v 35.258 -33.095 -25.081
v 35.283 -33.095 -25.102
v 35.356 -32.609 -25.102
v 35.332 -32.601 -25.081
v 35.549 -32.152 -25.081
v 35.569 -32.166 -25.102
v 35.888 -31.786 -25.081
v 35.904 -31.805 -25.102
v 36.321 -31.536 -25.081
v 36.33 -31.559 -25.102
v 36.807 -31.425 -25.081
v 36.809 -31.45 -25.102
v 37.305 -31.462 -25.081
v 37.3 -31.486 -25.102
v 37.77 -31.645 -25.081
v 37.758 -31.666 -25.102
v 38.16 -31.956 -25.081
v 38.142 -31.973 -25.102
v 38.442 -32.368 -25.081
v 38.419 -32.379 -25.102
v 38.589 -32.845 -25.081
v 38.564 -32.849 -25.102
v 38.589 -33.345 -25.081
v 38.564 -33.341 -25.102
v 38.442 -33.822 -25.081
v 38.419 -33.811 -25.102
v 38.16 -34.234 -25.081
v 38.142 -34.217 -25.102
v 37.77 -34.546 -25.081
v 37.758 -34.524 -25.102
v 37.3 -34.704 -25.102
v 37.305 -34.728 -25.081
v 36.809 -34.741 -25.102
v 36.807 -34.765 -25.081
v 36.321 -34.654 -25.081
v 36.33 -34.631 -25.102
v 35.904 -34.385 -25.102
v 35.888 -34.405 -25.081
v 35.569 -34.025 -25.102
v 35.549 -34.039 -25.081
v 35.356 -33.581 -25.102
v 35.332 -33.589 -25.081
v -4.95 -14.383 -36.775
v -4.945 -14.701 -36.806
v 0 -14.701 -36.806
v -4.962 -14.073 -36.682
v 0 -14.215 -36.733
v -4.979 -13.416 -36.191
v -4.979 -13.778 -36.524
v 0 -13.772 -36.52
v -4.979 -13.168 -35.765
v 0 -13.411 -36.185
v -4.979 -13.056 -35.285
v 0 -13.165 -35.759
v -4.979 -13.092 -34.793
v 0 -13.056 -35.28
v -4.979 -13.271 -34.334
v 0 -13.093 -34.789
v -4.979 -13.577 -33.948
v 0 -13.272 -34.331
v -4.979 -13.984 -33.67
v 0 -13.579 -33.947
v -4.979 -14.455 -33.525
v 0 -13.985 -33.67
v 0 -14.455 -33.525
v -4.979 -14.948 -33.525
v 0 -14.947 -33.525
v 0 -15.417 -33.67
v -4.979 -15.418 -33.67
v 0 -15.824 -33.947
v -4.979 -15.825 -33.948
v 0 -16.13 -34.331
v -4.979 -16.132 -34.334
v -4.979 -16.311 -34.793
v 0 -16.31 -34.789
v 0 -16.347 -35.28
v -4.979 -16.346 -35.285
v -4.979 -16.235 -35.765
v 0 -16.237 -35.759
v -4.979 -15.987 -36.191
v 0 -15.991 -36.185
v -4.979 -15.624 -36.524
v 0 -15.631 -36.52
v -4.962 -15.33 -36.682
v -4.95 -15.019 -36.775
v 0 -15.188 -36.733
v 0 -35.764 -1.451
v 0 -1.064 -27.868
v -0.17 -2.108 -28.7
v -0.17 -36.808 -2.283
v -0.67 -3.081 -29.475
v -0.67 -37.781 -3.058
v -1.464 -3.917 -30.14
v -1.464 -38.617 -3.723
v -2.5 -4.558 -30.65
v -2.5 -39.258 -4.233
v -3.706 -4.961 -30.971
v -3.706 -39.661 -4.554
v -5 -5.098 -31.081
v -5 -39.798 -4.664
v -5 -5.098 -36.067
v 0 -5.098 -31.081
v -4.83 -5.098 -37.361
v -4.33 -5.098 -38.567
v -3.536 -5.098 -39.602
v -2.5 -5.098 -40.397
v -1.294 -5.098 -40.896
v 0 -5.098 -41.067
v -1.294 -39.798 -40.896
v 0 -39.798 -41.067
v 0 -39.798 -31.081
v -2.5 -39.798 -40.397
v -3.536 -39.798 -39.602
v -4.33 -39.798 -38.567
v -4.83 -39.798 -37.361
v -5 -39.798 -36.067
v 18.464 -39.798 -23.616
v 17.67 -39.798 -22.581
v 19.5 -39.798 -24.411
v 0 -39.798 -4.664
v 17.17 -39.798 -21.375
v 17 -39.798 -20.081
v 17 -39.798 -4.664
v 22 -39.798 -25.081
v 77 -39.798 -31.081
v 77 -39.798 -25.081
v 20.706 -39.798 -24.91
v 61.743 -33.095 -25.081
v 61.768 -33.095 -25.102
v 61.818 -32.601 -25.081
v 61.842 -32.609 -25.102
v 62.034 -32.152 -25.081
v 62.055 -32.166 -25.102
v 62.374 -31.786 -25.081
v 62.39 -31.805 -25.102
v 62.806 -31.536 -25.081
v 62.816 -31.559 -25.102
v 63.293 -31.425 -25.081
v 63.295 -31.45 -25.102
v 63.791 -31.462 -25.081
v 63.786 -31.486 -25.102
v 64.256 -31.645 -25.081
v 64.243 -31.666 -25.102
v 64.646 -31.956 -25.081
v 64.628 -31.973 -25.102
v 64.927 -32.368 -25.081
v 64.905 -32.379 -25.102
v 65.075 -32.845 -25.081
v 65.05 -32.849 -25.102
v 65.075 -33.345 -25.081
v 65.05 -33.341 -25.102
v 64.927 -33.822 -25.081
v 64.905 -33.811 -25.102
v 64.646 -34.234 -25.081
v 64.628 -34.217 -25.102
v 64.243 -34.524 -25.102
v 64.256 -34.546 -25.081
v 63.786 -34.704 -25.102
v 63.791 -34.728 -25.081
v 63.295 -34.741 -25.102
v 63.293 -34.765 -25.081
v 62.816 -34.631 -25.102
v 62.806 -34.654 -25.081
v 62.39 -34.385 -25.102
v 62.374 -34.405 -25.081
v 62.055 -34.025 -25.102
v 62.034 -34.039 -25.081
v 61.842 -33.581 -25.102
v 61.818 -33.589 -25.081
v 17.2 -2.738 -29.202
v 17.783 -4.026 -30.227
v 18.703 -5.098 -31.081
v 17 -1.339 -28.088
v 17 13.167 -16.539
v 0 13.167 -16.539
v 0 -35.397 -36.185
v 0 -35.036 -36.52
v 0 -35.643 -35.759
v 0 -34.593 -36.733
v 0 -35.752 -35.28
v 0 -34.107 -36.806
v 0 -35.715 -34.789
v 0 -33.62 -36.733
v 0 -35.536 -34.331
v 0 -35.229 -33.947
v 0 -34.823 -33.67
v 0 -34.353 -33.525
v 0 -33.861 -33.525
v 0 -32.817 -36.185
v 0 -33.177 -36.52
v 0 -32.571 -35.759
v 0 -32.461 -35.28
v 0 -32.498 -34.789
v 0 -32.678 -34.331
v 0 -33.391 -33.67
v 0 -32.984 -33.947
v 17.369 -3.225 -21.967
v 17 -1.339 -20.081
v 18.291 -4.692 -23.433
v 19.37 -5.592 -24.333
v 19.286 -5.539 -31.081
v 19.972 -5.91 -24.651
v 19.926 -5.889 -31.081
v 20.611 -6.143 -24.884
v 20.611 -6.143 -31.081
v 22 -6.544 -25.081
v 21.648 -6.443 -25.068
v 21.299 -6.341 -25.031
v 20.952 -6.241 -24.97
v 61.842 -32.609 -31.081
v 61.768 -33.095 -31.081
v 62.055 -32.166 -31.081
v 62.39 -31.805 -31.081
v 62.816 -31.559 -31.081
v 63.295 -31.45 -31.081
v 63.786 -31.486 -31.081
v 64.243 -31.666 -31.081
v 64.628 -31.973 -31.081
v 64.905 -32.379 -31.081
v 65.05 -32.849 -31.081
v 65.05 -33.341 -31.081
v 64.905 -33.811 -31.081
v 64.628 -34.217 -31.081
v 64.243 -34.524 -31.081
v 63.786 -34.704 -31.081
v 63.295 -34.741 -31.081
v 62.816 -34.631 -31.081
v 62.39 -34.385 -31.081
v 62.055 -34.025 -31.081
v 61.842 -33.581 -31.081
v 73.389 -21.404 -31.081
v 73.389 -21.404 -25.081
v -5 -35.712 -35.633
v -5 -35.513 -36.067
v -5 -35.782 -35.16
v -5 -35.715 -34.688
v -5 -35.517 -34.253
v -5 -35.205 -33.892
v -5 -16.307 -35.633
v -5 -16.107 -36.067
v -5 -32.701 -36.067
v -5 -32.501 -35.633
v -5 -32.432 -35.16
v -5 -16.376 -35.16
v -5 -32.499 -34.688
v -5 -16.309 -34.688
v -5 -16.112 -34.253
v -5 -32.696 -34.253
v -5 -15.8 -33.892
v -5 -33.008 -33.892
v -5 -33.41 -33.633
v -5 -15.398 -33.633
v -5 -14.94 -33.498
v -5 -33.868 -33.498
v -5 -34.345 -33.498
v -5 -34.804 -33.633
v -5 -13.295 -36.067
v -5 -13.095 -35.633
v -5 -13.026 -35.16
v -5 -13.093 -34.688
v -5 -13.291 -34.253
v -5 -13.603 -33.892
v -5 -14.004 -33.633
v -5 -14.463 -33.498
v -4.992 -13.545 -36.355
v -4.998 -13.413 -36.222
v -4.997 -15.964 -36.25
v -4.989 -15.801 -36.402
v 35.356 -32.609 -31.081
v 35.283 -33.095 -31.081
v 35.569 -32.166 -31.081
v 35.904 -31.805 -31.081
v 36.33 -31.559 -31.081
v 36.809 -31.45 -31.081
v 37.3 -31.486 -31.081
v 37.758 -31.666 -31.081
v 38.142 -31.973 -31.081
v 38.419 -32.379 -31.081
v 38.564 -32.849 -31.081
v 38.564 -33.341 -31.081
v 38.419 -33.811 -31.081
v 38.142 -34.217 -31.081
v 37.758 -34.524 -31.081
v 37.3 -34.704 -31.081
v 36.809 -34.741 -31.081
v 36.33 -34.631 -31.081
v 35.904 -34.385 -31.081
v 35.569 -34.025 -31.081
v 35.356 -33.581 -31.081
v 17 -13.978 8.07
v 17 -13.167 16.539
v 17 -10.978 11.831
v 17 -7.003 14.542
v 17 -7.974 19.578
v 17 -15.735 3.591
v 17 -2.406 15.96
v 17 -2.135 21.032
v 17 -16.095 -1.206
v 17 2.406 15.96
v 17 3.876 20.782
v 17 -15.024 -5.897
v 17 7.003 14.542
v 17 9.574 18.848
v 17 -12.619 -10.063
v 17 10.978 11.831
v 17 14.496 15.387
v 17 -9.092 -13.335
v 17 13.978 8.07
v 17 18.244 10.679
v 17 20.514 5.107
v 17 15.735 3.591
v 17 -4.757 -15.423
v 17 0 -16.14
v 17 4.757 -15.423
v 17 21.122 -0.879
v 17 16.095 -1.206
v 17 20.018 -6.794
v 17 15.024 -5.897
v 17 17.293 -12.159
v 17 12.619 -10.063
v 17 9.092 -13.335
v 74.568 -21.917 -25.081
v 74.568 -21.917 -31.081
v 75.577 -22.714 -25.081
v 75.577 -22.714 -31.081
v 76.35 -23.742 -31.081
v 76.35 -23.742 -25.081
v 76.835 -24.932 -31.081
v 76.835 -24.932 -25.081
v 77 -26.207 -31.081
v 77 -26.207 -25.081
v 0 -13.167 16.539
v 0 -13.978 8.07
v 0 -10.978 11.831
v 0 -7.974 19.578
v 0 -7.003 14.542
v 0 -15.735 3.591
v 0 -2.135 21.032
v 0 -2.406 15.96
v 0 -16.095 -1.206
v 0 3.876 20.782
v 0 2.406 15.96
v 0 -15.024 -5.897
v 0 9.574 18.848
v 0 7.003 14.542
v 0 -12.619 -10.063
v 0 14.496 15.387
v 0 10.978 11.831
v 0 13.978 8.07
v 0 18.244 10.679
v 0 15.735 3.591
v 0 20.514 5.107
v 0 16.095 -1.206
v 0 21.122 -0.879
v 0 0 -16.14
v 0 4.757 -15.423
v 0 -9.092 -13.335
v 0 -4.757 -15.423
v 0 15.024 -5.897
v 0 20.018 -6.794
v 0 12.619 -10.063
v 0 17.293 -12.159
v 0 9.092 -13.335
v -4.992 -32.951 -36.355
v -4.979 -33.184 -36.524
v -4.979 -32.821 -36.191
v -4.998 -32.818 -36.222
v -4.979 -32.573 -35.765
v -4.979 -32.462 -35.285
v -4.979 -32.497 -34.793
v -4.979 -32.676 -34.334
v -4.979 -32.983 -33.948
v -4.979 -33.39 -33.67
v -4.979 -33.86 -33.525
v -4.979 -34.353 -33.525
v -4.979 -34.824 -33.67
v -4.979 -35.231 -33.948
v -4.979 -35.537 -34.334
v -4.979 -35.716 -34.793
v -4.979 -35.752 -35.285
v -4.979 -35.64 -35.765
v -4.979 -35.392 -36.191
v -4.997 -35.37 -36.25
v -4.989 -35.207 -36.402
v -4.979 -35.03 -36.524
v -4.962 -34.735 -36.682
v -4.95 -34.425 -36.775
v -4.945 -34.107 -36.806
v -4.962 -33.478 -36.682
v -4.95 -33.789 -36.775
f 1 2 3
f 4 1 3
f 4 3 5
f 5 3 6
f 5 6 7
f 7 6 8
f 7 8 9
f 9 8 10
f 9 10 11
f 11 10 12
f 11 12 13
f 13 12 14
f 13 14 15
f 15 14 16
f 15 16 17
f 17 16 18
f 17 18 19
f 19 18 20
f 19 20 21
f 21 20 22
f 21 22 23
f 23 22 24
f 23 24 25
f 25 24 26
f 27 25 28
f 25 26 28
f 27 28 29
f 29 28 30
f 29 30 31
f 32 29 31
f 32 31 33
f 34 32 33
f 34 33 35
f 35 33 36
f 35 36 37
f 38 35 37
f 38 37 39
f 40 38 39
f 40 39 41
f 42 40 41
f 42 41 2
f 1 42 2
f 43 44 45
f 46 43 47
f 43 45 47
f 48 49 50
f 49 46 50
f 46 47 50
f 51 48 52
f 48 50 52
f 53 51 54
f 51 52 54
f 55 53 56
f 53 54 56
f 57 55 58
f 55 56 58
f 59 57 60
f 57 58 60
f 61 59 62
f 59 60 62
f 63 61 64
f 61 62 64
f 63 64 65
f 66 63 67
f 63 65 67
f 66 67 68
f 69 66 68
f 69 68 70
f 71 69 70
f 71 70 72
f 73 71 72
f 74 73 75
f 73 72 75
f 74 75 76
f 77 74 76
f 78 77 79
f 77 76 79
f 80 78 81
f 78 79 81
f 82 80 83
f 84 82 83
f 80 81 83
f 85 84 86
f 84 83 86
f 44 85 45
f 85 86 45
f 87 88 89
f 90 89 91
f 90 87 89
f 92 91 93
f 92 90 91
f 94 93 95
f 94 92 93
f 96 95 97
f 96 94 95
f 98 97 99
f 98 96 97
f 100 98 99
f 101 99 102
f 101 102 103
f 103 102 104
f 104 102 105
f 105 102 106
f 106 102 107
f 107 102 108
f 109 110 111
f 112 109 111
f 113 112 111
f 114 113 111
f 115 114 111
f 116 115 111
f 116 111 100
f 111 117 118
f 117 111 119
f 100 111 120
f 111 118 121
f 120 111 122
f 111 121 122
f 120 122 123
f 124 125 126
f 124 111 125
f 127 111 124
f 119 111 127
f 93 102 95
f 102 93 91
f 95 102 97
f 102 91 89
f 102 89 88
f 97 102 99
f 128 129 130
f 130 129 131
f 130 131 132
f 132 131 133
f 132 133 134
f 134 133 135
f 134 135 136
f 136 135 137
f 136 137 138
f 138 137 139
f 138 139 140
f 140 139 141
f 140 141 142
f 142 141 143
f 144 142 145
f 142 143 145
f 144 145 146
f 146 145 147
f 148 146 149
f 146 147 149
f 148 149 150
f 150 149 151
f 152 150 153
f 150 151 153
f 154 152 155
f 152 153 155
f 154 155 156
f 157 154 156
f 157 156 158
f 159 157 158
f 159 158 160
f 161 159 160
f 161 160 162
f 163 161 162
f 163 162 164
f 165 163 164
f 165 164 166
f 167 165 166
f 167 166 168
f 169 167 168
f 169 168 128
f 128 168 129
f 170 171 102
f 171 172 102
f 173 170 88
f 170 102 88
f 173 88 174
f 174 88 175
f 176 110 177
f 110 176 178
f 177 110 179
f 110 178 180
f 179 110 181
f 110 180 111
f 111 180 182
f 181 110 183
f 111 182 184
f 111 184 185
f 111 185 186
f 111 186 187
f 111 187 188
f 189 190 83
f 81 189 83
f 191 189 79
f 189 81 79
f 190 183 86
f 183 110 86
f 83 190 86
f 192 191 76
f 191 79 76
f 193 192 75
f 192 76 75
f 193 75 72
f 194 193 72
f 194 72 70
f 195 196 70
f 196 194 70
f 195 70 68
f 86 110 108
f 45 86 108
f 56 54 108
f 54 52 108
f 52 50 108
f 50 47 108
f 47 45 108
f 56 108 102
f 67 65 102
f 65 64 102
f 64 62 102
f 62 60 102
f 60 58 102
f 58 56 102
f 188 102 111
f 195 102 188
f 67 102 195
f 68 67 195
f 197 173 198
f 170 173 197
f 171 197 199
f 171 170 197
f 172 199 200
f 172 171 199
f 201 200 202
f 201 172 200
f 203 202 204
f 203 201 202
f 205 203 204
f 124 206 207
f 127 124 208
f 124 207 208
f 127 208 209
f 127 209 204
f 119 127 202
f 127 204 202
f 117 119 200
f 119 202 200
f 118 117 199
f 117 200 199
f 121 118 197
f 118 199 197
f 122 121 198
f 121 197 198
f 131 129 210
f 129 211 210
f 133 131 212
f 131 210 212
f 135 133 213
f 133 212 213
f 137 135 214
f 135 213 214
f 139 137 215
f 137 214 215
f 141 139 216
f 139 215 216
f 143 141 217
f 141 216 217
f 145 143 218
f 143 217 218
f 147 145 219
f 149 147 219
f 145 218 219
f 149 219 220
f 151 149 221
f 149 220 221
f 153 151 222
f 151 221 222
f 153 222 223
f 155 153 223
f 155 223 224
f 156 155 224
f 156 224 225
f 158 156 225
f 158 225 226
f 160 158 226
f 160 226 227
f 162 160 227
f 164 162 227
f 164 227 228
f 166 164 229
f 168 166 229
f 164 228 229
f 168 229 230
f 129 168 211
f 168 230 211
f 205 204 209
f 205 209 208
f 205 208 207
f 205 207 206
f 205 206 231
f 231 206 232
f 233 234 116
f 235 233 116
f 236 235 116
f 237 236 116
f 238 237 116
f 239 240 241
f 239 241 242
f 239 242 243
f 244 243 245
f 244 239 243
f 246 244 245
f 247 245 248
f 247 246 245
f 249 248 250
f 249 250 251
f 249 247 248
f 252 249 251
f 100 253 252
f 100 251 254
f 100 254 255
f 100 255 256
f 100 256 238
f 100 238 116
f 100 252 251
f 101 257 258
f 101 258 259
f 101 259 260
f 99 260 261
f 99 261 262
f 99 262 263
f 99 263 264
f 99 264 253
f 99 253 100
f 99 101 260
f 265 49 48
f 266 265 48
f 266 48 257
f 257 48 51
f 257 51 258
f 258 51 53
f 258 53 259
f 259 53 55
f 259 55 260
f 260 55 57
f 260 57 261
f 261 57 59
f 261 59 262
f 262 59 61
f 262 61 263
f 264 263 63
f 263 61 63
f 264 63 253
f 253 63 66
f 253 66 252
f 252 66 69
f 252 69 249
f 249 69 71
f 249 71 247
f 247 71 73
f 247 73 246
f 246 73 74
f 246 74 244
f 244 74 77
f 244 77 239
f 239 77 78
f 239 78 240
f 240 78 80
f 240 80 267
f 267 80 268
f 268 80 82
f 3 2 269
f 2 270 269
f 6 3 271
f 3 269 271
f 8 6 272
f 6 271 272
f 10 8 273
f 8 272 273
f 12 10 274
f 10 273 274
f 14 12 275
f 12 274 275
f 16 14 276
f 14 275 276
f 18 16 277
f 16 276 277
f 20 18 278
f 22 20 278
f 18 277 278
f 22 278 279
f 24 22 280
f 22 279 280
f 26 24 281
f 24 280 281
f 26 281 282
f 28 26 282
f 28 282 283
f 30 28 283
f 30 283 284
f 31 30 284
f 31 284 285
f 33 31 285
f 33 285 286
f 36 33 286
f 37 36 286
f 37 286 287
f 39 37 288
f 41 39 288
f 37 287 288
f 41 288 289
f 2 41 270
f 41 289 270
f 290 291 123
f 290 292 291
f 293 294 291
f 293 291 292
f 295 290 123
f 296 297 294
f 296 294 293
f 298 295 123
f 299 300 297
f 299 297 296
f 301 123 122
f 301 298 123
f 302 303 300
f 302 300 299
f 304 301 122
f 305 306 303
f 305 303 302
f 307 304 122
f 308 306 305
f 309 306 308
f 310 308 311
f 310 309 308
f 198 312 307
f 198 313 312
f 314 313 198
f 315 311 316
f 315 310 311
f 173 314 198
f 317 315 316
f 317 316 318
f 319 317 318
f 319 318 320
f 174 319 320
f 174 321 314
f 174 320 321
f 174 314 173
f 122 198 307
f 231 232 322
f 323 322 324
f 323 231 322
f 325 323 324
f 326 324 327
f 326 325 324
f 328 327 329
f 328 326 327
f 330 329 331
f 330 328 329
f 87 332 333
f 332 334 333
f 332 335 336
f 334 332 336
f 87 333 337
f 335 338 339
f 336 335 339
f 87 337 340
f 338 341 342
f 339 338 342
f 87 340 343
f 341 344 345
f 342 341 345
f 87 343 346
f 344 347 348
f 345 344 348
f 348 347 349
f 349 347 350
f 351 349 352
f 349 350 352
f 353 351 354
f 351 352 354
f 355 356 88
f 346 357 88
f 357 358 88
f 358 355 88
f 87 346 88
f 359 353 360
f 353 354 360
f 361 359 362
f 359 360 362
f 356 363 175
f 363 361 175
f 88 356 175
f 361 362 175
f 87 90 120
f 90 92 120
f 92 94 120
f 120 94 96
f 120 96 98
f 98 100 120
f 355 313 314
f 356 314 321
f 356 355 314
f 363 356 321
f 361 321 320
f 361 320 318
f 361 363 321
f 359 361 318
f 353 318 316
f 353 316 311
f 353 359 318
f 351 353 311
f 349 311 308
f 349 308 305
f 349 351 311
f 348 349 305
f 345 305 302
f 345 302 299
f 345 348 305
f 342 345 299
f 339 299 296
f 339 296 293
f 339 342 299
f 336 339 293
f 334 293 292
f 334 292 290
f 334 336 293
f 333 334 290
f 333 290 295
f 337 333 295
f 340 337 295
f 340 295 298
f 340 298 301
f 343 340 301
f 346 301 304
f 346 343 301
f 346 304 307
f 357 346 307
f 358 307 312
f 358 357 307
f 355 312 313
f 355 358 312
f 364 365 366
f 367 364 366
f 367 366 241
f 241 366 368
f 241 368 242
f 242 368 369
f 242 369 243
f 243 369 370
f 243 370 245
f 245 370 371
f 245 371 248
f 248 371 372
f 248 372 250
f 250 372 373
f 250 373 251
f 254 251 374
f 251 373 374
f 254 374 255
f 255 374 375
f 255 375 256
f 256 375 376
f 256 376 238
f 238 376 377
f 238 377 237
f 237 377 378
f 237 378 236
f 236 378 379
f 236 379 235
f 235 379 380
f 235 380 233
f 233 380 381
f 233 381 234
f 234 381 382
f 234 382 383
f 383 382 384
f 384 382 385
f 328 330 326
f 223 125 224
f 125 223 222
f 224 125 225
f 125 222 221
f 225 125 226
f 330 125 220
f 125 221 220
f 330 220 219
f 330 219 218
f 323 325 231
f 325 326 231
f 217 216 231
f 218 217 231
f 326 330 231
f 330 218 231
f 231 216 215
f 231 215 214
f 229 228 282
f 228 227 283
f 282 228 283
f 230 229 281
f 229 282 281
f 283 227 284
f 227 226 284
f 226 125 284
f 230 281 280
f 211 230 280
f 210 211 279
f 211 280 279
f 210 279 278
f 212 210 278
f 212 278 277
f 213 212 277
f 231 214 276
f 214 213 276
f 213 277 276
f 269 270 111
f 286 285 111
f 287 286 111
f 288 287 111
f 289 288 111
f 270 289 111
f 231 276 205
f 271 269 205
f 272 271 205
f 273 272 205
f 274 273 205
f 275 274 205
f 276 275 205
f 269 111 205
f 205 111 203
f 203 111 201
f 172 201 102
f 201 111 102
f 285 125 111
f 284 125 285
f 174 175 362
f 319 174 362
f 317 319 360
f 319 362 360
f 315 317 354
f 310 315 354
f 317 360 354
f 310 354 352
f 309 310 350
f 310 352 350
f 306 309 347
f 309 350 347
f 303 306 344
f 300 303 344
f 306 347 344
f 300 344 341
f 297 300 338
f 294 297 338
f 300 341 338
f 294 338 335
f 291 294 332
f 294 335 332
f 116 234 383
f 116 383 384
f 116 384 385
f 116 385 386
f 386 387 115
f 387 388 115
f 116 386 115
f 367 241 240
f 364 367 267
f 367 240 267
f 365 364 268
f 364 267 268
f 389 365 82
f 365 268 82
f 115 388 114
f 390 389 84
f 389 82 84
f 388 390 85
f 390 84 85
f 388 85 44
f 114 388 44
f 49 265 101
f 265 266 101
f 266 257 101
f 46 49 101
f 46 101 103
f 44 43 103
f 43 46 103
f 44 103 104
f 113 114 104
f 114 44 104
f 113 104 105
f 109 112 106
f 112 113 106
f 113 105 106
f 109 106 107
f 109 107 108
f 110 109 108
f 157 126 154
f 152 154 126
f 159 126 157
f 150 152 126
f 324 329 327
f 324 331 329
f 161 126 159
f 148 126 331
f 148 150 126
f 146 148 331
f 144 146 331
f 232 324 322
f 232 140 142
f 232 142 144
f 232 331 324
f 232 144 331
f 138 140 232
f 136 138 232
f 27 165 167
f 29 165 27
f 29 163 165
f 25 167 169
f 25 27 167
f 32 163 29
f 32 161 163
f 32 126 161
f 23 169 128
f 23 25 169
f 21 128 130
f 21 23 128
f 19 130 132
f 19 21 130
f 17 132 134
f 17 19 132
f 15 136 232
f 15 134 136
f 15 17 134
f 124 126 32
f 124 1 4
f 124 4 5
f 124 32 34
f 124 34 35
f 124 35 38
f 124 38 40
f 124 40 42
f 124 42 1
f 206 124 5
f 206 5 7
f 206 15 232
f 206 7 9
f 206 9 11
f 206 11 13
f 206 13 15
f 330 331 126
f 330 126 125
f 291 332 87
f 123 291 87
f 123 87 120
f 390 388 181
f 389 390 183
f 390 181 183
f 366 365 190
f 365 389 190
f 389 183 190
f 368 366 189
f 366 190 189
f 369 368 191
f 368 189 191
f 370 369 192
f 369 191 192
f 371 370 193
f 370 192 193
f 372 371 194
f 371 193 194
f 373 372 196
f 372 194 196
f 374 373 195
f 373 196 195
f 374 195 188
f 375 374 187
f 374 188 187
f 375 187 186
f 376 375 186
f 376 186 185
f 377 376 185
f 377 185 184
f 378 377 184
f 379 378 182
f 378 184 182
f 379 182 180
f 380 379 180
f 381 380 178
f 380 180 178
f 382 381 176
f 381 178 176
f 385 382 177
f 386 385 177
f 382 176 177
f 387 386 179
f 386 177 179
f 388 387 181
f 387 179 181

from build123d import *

# Parameters (mm, degrees)
SKETCH1_R                             = 21.14
SKETCH1_R_2                           = 16.14
BOSS_EXTRUDE1_DEPTH                   = 17
BOSS_EXTRUDE2_DEPTH                   = 17
SKETCH3_W                             = 6
SKETCH3_H                             = 34.7
BOSS_EXTRUDE3_DEPTH                   = 60
CUT_EXTRUDE1_DEPTH                    = 30
FILLET1_R                             = 5
BOSS_EXTRUDE4_DEPTH                   = 5
FILLET2_R                             = 5
TAP_DRILL_FOR_M4X0_7_TAP1_D           = 3.3
TAP_DRILL_FOR_M4X0_7_TAP1_DEPTH       = 5
TAP_DRILL_FOR_M4X0_7_TAP1_CSINK_D     = 3.35
TAP_DRILL_FOR_M4X0_7_TAP1_CSINK_ANGLE = 100
TAP_DRILL_FOR_M4X0_7_TAP1_TIP         = 0.991420021
TAP_DRILL_FOR_M4X0_7_TAP2_D           = 3.3
TAP_DRILL_FOR_M4X0_7_TAP2_DEPTH       = 7
TAP_DRILL_FOR_M4X0_7_TAP2_CSINK_D     = 3.35
TAP_DRILL_FOR_M4X0_7_TAP2_CSINK_ANGLE = 100
TAP_DRILL_FOR_M4X0_7_TAP2_TIP         = 0.991420021


with BuildPart() as part:
    # Sketch1 → Boss-Extrude1 (new body)
    with BuildSketch(Plane(origin=(0, 0, 0), x_dir=(0, 0, -1), z_dir=(1, 0, 0))):
        Circle(SKETCH1_R)
        Circle(SKETCH1_R_2, mode=Mode.SUBTRACT)
    extrude(amount=BOSS_EXTRUDE1_DEPTH)

    # Sketch2 → Boss-Extrude2 (add)
    with BuildSketch(Plane.ZY):
        with BuildLine():
            Line((-31.080697416, -39.798400642), (-31.080697416, -5.098400642))
            Line((-31.080697416, -5.098400642), (-16.538596663, 13.167172074))
            ThreePointArc((-16.538596663, 13.167172074), (-13.167172074, -16.538596663), (16.538596663, -13.167172074))
            Line((16.538596663, -13.167172074), (-4.663804983, -39.798400642))
            Line((-4.663804983, -39.798400642), (-31.080697416, -39.798400642))
        make_face()
    extrude(amount=-BOSS_EXTRUDE2_DEPTH)

    # Sketch3 → Boss-Extrude3 (add)
    with BuildSketch(Plane(origin=(17, 0, 0), x_dir=(0, 0, -1), z_dir=(1, 0, 0))):
        with Locations((28.080697416, -22.448400642)):
            Rectangle(SKETCH3_W, SKETCH3_H)
    extrude(amount=BOSS_EXTRUDE3_DEPTH)

    # Sketch4 → Cut-Extrude1 (cut)
    with BuildSketch(Plane.XY.offset(-25.080697416)):
        Polygon((17, -5.098400642), (77, -22.448400642), (77, -5.098400642), align=None)
    extrude(amount=-CUT_EXTRUDE1_DEPTH, mode=Mode.SUBTRACT)

    # Fillet1
    fillet1_edges = [part.edges().sort_by_distance(p)[0] for p in [
        (17, -5.098400642, -28.080697416),
        (17, -22.448400642, -25.080697416),
        (77, -22.448400642, -28.080697416),
    ]]
    fillet(fillet1_edges, radius=FILLET1_R)

    # Sketch5 → Boss-Extrude4 (add)
    with BuildSketch(Plane.ZY):
        Polygon((-31.080697416, -5.098400642), (-41.06651396, -5.098400642), (-41.06651396, -39.798400642), (-25.501919328, -39.798400642), (-4.663804983, -39.798400642), align=None)
    extrude(amount=BOSS_EXTRUDE4_DEPTH)

    # Fillet2
    # the kernel refuses this fillet: 5 mm, written as the material it adds along each edge
    with BuildSketch(Plane(origin=(0, -49.744226019, 2.907889517), x_dir=(0, 0.6057355599289151, 0.795666030089009), z_dir=(0, 0.795666030089009, -0.6057355599289151))) as fillet2_piece_1_section:
        with BuildLine():
            CenterArc((FILLET2_R, -FILLET2_R), FILLET2_R, 90, 90)
            Line((0, -FILLET2_R), (0, 0))
            Line((0, 0), (FILLET2_R, 0))
        make_face()
    fillet2_piece_1 = extrude(amount=68.611262374, mode=Mode.PRIVATE)
    fillet2_piece_1 = split(fillet2_piece_1, bisect_by=Plane(origin=(-1.148121472, -8.497406794, -33.786809657), z_dir=(0, -0.6228558218455279, 0.7823366444141115)), keep=Keep.TOP, mode=Mode.PRIVATE)
    fillet2_piece_1 = split(fillet2_piece_1, bisect_by=Plane(origin=(-1.148121472, -34.831750942, -0.709616331), z_dir=(0, 0.6228558218455282, -0.7823366444141113)), keep=Keep.TOP, mode=Mode.PRIVATE)
    fillet2_piece_1 = split(fillet2_piece_1, bisect_by=Plane(origin=(-1.148121472, -39.798400642, -16.823425528), z_dir=(0, 1, 0)), keep=Keep.TOP, mode=Mode.PRIVATE)
    add(fillet2_piece_1)
    # the kernel refuses this fillet: 5 mm, written as the material it takes off along each edge
    with BuildSketch(Plane(origin=(-5, 7.401599358, -41.06651396), x_dir=(0, 0, 1), z_dir=(0, -1, 0))) as fillet2_2_piece_1:
        with BuildLine():
            CenterArc((FILLET2_R, -FILLET2_R), FILLET2_R, 90, 90)
            Line((0, -FILLET2_R), (0, 0))
            Line((0, 0), (FILLET2_R, 0))
        make_face()
    extrude(amount=59.7, mode=Mode.SUBTRACT)

    # Tap Drill for M4x0.7 Tap1
    with Locations(Plane.ZY.offset(5)):
        with Locations((-35.156261267, -14.70127854), (-35.156261267, -34.106690994)):
            CounterSinkHole(TAP_DRILL_FOR_M4X0_7_TAP1_D / 2, TAP_DRILL_FOR_M4X0_7_TAP1_CSINK_D / 2, depth=TAP_DRILL_FOR_M4X0_7_TAP1_DEPTH, counter_sink_angle=TAP_DRILL_FOR_M4X0_7_TAP1_CSINK_ANGLE)
            with Locations((0, 0, -(TAP_DRILL_FOR_M4X0_7_TAP1_DEPTH + TAP_DRILL_FOR_M4X0_7_TAP1_TIP / 2))):  # 118° drill point
                Cone(0, TAP_DRILL_FOR_M4X0_7_TAP1_D / 2, TAP_DRILL_FOR_M4X0_7_TAP1_TIP, mode=Mode.SUBTRACT)

    # Tap Drill for M4x0.7 Tap2
    with Locations(Plane.XY.offset(-25.080697416)):
        with Locations((36.93257039, -33.095127913), (63.418354043, -33.095127913)):
            CounterSinkHole(TAP_DRILL_FOR_M4X0_7_TAP2_D / 2, TAP_DRILL_FOR_M4X0_7_TAP2_CSINK_D / 2, depth=TAP_DRILL_FOR_M4X0_7_TAP2_DEPTH, counter_sink_angle=TAP_DRILL_FOR_M4X0_7_TAP2_CSINK_ANGLE)
            with Locations((0, 0, -(TAP_DRILL_FOR_M4X0_7_TAP2_DEPTH + TAP_DRILL_FOR_M4X0_7_TAP2_TIP / 2))):  # 118° drill point
                Cone(0, TAP_DRILL_FOR_M4X0_7_TAP2_D / 2, TAP_DRILL_FOR_M4X0_7_TAP2_TIP, mode=Mode.SUBTRACT)


solid = part.part
